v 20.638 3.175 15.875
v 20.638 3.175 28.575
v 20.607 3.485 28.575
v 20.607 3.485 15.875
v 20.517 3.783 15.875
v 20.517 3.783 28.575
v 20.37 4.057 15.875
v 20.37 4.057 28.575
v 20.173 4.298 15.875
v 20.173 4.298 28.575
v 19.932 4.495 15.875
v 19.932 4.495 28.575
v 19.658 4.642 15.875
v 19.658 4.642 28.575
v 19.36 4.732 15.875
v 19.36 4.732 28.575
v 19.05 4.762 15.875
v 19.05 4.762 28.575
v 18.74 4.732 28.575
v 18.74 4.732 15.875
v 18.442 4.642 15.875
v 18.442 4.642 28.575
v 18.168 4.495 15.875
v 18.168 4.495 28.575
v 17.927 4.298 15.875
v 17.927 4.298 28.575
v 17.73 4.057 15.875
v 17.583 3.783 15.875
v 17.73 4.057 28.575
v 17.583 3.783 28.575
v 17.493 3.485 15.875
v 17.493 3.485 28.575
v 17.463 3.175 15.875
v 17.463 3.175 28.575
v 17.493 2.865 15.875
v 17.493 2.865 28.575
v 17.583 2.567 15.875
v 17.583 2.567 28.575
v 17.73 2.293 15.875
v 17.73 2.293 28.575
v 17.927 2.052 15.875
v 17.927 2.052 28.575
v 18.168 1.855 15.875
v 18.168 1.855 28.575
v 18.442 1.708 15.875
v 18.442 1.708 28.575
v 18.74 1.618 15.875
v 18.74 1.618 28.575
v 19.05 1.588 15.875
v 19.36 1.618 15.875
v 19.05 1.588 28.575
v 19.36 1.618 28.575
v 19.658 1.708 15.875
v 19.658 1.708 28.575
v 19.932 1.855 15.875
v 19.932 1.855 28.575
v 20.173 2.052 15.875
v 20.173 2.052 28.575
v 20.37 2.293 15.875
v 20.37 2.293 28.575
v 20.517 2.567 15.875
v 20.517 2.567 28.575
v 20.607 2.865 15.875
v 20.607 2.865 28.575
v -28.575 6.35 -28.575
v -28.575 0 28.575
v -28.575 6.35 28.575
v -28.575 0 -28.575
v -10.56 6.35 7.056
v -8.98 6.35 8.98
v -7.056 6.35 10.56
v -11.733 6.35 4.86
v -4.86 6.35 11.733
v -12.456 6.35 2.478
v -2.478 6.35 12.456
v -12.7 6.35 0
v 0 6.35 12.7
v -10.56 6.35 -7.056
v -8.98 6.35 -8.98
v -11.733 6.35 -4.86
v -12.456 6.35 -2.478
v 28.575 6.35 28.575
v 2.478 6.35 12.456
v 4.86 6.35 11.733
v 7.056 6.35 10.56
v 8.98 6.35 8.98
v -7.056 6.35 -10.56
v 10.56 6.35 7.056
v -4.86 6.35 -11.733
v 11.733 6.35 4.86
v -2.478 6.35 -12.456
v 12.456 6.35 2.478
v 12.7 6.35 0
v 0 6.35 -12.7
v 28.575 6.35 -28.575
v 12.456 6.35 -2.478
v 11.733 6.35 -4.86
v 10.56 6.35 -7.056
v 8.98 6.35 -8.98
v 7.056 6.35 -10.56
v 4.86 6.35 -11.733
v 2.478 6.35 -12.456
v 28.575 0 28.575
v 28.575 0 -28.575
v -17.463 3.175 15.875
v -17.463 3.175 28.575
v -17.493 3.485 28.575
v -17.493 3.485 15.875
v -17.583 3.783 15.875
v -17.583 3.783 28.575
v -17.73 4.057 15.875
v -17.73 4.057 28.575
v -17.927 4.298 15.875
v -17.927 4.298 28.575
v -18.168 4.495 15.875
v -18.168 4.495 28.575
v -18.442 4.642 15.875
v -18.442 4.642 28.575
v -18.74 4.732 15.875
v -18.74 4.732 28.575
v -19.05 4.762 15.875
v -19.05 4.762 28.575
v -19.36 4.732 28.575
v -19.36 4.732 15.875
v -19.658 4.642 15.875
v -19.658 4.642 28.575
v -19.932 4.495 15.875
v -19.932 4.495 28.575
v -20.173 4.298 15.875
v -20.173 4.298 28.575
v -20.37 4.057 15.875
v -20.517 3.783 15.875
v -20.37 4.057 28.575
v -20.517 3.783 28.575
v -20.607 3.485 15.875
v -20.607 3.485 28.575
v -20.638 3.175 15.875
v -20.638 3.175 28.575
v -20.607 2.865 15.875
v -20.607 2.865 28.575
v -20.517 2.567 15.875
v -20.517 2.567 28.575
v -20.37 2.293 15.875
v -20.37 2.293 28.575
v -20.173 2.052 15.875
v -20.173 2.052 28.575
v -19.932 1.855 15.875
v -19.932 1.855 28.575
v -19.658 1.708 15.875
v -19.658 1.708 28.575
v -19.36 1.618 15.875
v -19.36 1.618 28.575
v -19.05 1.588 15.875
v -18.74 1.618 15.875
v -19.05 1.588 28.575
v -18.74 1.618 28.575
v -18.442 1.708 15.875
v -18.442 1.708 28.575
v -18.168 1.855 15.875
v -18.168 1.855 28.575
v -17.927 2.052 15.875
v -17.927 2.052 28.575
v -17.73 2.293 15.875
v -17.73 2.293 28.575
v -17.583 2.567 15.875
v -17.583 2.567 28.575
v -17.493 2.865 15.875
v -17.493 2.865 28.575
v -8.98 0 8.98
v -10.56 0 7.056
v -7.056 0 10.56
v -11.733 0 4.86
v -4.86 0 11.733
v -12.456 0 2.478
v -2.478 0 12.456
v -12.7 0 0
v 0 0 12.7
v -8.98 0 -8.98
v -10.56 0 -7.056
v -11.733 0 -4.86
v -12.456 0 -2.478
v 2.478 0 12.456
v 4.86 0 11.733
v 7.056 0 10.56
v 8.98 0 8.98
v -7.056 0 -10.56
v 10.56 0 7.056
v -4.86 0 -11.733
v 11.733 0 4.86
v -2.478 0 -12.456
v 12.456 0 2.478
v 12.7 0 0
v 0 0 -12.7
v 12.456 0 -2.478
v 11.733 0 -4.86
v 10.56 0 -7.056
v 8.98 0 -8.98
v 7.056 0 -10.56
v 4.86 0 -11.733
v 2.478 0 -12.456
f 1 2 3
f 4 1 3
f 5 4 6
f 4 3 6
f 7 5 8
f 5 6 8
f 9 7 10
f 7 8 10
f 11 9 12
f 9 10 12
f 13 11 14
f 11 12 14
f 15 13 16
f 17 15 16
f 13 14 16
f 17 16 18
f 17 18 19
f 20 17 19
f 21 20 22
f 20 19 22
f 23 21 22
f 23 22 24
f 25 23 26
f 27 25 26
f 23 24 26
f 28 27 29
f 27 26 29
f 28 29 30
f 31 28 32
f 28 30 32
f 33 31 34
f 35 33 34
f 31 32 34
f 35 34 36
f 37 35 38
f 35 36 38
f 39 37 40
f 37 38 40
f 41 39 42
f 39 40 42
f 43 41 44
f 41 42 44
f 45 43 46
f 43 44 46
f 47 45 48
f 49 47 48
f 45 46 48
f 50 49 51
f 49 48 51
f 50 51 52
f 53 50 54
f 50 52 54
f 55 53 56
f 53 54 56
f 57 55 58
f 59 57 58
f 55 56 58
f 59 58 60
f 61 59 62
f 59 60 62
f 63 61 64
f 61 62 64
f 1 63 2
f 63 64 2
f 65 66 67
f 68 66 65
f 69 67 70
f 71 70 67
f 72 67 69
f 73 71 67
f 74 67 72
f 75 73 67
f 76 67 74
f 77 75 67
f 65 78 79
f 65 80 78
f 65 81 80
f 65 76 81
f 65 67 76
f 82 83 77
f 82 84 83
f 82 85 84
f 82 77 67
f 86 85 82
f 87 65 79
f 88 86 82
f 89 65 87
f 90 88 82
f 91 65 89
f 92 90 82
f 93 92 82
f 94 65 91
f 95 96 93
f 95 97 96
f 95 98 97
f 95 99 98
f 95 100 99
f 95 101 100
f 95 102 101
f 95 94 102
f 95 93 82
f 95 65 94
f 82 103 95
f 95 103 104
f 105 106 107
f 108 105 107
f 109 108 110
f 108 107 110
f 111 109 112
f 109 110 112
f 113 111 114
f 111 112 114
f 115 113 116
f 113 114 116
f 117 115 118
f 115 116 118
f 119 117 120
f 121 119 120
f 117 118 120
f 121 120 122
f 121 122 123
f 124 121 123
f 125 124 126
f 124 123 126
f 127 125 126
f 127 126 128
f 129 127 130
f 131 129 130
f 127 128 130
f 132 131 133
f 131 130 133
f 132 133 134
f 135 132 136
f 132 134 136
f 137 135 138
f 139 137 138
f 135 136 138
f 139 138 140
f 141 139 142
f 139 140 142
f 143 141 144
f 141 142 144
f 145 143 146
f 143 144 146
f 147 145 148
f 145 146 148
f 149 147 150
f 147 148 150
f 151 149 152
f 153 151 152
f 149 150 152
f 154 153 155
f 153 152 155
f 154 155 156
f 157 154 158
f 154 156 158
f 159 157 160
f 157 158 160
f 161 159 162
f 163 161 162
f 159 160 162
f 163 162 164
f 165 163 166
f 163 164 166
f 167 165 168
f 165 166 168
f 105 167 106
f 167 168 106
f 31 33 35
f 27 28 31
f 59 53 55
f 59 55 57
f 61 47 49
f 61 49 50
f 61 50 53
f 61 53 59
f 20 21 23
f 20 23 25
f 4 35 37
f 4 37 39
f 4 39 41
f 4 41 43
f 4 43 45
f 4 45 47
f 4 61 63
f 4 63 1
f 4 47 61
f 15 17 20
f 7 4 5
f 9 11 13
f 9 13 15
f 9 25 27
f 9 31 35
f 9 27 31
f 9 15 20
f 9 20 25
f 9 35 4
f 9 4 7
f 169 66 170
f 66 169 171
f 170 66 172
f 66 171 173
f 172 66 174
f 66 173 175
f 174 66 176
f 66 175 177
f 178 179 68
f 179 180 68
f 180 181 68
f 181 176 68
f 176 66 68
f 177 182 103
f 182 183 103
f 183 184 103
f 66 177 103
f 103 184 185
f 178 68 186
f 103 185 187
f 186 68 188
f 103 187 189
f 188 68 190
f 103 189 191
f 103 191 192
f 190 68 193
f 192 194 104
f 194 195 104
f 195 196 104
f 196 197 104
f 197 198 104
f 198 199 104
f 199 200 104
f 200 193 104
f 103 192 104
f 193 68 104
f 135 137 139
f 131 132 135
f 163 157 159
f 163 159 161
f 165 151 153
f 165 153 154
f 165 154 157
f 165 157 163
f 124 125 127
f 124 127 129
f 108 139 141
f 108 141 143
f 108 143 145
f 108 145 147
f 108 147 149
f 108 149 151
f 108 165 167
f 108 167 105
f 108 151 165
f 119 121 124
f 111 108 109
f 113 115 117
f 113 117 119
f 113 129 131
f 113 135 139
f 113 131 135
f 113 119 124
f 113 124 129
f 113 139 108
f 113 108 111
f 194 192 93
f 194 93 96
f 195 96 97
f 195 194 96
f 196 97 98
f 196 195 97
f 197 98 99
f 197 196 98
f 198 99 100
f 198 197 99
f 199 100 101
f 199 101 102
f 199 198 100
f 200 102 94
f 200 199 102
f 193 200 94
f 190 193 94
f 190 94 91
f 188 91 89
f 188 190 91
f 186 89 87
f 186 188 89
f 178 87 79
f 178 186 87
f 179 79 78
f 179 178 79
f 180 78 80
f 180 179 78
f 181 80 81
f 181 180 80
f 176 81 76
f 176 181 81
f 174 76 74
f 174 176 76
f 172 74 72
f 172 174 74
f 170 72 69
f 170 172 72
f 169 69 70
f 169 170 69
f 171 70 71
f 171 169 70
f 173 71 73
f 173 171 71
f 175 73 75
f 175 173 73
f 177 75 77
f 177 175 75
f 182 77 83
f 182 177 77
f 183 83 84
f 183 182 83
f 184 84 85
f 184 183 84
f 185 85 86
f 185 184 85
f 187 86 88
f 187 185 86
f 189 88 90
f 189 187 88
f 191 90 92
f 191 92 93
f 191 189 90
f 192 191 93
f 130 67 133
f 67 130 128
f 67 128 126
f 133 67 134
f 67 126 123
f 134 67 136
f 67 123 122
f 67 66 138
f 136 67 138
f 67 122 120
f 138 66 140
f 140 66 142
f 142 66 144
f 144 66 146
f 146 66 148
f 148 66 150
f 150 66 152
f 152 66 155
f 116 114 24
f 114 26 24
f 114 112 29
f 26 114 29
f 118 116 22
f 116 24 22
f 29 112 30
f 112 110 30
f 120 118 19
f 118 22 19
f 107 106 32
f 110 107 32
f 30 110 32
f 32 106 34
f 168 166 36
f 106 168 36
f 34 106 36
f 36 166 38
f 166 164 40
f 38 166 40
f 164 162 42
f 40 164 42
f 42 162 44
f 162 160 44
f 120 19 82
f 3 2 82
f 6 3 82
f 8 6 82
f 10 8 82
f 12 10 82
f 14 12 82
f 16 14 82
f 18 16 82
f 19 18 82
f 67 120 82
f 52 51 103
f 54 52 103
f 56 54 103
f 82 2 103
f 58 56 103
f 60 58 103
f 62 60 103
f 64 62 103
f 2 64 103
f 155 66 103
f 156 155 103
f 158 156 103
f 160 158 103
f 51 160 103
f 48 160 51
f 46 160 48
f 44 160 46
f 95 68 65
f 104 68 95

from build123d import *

# Parameters (mm, degrees)
SKETCH1_W           = 57.15
SKETCH1_H           = 57.15
SKETCH1_R           = 12.7
BOSS_EXTRUDE1_DEPTH = 6.35
SKETCH2_R           = 1.5875
CUT_EXTRUDE1_DEPTH  = 12.7


with BuildPart() as part:
    # Sketch1 → Boss-Extrude1 (new body)
    with BuildSketch(Plane(origin=(0, 0, 0), x_dir=(1, 0, 0), z_dir=(0, 1, 0))):
        Rectangle(SKETCH1_W, SKETCH1_H)
        Circle(SKETCH1_R, mode=Mode.SUBTRACT)
    extrude(amount=BOSS_EXTRUDE1_DEPTH)

    # Sketch2 → Cut-Extrude1 (cut)
    with BuildSketch(Plane.XY.offset(28.575)):
        with Locations((-19.05, 3.175)):
            Circle(SKETCH2_R)
        with Locations((19.05, 3.175)):
            Circle(SKETCH2_R)
    extrude(amount=-CUT_EXTRUDE1_DEPTH, mode=Mode.SUBTRACT)


solid = part.part
